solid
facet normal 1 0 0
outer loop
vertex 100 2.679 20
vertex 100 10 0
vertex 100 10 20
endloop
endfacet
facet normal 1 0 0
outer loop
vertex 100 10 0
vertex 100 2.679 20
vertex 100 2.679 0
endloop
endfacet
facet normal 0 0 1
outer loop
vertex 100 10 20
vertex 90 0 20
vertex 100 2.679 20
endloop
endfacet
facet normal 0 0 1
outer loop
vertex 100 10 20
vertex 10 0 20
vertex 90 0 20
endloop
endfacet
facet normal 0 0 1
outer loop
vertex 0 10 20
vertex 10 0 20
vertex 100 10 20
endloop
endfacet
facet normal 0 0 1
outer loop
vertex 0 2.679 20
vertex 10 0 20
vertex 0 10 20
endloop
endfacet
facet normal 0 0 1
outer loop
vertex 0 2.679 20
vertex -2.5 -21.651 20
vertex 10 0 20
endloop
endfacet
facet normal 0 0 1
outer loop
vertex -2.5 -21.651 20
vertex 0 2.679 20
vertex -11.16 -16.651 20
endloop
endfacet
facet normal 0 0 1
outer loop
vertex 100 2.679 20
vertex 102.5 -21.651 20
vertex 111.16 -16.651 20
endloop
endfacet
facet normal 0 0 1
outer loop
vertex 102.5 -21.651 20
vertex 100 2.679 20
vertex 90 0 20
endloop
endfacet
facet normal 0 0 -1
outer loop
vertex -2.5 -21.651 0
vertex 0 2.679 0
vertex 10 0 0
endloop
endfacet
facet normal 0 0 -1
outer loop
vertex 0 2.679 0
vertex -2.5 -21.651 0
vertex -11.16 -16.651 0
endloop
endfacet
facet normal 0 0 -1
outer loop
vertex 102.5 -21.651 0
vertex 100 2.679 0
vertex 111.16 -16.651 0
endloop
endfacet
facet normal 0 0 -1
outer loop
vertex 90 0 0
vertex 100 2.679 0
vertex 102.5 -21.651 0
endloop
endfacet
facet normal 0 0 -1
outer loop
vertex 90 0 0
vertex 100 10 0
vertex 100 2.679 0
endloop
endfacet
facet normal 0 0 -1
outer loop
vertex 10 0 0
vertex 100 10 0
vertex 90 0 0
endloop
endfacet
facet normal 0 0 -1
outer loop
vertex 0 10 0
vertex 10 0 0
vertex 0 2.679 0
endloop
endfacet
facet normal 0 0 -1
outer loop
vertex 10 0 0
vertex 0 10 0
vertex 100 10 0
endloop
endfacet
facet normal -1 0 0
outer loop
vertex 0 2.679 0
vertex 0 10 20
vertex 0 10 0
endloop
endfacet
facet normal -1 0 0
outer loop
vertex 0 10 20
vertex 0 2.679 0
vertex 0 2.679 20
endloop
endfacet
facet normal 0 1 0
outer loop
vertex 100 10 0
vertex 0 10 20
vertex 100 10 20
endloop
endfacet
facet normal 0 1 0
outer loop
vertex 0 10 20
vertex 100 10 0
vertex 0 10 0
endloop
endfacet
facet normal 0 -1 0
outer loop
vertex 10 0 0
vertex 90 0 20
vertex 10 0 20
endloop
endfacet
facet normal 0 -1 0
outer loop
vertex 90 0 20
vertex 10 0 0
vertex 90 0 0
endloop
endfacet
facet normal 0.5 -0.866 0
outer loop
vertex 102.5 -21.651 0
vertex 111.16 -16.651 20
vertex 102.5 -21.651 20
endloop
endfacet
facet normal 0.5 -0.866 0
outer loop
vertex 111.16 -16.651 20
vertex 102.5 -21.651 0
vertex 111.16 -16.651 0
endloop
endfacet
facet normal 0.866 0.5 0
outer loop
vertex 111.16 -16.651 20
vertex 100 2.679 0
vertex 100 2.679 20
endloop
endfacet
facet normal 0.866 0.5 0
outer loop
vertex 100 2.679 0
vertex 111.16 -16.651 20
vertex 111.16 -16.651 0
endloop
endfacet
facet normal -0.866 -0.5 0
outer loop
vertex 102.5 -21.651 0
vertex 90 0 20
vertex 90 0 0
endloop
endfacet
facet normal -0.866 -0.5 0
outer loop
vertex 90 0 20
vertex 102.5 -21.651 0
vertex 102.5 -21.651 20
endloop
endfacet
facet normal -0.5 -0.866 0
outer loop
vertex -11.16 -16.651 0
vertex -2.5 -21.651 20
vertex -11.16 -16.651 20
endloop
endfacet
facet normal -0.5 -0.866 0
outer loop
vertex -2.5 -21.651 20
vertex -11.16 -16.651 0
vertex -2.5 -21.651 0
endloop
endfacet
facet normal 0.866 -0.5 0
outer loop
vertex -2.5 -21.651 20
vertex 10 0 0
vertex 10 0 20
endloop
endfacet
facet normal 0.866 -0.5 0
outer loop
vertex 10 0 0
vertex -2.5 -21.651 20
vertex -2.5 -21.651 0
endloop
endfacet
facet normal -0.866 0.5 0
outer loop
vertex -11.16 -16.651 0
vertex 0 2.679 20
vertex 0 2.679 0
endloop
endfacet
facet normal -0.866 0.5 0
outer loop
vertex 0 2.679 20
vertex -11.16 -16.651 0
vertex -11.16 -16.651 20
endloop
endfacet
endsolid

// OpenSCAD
module pusher(length){
	union(){
		cube([length, 10, 20]);	
		translate([length-10,0,0]) rotate(a=-60,v=[0,0,1]) cube([25,10,20]);
		translate([10,0,0]) mirror([1,0,0]) rotate(a=-60,v=[0,0,1]) cube([25,10,20]);


	}
}

pusher(100);
